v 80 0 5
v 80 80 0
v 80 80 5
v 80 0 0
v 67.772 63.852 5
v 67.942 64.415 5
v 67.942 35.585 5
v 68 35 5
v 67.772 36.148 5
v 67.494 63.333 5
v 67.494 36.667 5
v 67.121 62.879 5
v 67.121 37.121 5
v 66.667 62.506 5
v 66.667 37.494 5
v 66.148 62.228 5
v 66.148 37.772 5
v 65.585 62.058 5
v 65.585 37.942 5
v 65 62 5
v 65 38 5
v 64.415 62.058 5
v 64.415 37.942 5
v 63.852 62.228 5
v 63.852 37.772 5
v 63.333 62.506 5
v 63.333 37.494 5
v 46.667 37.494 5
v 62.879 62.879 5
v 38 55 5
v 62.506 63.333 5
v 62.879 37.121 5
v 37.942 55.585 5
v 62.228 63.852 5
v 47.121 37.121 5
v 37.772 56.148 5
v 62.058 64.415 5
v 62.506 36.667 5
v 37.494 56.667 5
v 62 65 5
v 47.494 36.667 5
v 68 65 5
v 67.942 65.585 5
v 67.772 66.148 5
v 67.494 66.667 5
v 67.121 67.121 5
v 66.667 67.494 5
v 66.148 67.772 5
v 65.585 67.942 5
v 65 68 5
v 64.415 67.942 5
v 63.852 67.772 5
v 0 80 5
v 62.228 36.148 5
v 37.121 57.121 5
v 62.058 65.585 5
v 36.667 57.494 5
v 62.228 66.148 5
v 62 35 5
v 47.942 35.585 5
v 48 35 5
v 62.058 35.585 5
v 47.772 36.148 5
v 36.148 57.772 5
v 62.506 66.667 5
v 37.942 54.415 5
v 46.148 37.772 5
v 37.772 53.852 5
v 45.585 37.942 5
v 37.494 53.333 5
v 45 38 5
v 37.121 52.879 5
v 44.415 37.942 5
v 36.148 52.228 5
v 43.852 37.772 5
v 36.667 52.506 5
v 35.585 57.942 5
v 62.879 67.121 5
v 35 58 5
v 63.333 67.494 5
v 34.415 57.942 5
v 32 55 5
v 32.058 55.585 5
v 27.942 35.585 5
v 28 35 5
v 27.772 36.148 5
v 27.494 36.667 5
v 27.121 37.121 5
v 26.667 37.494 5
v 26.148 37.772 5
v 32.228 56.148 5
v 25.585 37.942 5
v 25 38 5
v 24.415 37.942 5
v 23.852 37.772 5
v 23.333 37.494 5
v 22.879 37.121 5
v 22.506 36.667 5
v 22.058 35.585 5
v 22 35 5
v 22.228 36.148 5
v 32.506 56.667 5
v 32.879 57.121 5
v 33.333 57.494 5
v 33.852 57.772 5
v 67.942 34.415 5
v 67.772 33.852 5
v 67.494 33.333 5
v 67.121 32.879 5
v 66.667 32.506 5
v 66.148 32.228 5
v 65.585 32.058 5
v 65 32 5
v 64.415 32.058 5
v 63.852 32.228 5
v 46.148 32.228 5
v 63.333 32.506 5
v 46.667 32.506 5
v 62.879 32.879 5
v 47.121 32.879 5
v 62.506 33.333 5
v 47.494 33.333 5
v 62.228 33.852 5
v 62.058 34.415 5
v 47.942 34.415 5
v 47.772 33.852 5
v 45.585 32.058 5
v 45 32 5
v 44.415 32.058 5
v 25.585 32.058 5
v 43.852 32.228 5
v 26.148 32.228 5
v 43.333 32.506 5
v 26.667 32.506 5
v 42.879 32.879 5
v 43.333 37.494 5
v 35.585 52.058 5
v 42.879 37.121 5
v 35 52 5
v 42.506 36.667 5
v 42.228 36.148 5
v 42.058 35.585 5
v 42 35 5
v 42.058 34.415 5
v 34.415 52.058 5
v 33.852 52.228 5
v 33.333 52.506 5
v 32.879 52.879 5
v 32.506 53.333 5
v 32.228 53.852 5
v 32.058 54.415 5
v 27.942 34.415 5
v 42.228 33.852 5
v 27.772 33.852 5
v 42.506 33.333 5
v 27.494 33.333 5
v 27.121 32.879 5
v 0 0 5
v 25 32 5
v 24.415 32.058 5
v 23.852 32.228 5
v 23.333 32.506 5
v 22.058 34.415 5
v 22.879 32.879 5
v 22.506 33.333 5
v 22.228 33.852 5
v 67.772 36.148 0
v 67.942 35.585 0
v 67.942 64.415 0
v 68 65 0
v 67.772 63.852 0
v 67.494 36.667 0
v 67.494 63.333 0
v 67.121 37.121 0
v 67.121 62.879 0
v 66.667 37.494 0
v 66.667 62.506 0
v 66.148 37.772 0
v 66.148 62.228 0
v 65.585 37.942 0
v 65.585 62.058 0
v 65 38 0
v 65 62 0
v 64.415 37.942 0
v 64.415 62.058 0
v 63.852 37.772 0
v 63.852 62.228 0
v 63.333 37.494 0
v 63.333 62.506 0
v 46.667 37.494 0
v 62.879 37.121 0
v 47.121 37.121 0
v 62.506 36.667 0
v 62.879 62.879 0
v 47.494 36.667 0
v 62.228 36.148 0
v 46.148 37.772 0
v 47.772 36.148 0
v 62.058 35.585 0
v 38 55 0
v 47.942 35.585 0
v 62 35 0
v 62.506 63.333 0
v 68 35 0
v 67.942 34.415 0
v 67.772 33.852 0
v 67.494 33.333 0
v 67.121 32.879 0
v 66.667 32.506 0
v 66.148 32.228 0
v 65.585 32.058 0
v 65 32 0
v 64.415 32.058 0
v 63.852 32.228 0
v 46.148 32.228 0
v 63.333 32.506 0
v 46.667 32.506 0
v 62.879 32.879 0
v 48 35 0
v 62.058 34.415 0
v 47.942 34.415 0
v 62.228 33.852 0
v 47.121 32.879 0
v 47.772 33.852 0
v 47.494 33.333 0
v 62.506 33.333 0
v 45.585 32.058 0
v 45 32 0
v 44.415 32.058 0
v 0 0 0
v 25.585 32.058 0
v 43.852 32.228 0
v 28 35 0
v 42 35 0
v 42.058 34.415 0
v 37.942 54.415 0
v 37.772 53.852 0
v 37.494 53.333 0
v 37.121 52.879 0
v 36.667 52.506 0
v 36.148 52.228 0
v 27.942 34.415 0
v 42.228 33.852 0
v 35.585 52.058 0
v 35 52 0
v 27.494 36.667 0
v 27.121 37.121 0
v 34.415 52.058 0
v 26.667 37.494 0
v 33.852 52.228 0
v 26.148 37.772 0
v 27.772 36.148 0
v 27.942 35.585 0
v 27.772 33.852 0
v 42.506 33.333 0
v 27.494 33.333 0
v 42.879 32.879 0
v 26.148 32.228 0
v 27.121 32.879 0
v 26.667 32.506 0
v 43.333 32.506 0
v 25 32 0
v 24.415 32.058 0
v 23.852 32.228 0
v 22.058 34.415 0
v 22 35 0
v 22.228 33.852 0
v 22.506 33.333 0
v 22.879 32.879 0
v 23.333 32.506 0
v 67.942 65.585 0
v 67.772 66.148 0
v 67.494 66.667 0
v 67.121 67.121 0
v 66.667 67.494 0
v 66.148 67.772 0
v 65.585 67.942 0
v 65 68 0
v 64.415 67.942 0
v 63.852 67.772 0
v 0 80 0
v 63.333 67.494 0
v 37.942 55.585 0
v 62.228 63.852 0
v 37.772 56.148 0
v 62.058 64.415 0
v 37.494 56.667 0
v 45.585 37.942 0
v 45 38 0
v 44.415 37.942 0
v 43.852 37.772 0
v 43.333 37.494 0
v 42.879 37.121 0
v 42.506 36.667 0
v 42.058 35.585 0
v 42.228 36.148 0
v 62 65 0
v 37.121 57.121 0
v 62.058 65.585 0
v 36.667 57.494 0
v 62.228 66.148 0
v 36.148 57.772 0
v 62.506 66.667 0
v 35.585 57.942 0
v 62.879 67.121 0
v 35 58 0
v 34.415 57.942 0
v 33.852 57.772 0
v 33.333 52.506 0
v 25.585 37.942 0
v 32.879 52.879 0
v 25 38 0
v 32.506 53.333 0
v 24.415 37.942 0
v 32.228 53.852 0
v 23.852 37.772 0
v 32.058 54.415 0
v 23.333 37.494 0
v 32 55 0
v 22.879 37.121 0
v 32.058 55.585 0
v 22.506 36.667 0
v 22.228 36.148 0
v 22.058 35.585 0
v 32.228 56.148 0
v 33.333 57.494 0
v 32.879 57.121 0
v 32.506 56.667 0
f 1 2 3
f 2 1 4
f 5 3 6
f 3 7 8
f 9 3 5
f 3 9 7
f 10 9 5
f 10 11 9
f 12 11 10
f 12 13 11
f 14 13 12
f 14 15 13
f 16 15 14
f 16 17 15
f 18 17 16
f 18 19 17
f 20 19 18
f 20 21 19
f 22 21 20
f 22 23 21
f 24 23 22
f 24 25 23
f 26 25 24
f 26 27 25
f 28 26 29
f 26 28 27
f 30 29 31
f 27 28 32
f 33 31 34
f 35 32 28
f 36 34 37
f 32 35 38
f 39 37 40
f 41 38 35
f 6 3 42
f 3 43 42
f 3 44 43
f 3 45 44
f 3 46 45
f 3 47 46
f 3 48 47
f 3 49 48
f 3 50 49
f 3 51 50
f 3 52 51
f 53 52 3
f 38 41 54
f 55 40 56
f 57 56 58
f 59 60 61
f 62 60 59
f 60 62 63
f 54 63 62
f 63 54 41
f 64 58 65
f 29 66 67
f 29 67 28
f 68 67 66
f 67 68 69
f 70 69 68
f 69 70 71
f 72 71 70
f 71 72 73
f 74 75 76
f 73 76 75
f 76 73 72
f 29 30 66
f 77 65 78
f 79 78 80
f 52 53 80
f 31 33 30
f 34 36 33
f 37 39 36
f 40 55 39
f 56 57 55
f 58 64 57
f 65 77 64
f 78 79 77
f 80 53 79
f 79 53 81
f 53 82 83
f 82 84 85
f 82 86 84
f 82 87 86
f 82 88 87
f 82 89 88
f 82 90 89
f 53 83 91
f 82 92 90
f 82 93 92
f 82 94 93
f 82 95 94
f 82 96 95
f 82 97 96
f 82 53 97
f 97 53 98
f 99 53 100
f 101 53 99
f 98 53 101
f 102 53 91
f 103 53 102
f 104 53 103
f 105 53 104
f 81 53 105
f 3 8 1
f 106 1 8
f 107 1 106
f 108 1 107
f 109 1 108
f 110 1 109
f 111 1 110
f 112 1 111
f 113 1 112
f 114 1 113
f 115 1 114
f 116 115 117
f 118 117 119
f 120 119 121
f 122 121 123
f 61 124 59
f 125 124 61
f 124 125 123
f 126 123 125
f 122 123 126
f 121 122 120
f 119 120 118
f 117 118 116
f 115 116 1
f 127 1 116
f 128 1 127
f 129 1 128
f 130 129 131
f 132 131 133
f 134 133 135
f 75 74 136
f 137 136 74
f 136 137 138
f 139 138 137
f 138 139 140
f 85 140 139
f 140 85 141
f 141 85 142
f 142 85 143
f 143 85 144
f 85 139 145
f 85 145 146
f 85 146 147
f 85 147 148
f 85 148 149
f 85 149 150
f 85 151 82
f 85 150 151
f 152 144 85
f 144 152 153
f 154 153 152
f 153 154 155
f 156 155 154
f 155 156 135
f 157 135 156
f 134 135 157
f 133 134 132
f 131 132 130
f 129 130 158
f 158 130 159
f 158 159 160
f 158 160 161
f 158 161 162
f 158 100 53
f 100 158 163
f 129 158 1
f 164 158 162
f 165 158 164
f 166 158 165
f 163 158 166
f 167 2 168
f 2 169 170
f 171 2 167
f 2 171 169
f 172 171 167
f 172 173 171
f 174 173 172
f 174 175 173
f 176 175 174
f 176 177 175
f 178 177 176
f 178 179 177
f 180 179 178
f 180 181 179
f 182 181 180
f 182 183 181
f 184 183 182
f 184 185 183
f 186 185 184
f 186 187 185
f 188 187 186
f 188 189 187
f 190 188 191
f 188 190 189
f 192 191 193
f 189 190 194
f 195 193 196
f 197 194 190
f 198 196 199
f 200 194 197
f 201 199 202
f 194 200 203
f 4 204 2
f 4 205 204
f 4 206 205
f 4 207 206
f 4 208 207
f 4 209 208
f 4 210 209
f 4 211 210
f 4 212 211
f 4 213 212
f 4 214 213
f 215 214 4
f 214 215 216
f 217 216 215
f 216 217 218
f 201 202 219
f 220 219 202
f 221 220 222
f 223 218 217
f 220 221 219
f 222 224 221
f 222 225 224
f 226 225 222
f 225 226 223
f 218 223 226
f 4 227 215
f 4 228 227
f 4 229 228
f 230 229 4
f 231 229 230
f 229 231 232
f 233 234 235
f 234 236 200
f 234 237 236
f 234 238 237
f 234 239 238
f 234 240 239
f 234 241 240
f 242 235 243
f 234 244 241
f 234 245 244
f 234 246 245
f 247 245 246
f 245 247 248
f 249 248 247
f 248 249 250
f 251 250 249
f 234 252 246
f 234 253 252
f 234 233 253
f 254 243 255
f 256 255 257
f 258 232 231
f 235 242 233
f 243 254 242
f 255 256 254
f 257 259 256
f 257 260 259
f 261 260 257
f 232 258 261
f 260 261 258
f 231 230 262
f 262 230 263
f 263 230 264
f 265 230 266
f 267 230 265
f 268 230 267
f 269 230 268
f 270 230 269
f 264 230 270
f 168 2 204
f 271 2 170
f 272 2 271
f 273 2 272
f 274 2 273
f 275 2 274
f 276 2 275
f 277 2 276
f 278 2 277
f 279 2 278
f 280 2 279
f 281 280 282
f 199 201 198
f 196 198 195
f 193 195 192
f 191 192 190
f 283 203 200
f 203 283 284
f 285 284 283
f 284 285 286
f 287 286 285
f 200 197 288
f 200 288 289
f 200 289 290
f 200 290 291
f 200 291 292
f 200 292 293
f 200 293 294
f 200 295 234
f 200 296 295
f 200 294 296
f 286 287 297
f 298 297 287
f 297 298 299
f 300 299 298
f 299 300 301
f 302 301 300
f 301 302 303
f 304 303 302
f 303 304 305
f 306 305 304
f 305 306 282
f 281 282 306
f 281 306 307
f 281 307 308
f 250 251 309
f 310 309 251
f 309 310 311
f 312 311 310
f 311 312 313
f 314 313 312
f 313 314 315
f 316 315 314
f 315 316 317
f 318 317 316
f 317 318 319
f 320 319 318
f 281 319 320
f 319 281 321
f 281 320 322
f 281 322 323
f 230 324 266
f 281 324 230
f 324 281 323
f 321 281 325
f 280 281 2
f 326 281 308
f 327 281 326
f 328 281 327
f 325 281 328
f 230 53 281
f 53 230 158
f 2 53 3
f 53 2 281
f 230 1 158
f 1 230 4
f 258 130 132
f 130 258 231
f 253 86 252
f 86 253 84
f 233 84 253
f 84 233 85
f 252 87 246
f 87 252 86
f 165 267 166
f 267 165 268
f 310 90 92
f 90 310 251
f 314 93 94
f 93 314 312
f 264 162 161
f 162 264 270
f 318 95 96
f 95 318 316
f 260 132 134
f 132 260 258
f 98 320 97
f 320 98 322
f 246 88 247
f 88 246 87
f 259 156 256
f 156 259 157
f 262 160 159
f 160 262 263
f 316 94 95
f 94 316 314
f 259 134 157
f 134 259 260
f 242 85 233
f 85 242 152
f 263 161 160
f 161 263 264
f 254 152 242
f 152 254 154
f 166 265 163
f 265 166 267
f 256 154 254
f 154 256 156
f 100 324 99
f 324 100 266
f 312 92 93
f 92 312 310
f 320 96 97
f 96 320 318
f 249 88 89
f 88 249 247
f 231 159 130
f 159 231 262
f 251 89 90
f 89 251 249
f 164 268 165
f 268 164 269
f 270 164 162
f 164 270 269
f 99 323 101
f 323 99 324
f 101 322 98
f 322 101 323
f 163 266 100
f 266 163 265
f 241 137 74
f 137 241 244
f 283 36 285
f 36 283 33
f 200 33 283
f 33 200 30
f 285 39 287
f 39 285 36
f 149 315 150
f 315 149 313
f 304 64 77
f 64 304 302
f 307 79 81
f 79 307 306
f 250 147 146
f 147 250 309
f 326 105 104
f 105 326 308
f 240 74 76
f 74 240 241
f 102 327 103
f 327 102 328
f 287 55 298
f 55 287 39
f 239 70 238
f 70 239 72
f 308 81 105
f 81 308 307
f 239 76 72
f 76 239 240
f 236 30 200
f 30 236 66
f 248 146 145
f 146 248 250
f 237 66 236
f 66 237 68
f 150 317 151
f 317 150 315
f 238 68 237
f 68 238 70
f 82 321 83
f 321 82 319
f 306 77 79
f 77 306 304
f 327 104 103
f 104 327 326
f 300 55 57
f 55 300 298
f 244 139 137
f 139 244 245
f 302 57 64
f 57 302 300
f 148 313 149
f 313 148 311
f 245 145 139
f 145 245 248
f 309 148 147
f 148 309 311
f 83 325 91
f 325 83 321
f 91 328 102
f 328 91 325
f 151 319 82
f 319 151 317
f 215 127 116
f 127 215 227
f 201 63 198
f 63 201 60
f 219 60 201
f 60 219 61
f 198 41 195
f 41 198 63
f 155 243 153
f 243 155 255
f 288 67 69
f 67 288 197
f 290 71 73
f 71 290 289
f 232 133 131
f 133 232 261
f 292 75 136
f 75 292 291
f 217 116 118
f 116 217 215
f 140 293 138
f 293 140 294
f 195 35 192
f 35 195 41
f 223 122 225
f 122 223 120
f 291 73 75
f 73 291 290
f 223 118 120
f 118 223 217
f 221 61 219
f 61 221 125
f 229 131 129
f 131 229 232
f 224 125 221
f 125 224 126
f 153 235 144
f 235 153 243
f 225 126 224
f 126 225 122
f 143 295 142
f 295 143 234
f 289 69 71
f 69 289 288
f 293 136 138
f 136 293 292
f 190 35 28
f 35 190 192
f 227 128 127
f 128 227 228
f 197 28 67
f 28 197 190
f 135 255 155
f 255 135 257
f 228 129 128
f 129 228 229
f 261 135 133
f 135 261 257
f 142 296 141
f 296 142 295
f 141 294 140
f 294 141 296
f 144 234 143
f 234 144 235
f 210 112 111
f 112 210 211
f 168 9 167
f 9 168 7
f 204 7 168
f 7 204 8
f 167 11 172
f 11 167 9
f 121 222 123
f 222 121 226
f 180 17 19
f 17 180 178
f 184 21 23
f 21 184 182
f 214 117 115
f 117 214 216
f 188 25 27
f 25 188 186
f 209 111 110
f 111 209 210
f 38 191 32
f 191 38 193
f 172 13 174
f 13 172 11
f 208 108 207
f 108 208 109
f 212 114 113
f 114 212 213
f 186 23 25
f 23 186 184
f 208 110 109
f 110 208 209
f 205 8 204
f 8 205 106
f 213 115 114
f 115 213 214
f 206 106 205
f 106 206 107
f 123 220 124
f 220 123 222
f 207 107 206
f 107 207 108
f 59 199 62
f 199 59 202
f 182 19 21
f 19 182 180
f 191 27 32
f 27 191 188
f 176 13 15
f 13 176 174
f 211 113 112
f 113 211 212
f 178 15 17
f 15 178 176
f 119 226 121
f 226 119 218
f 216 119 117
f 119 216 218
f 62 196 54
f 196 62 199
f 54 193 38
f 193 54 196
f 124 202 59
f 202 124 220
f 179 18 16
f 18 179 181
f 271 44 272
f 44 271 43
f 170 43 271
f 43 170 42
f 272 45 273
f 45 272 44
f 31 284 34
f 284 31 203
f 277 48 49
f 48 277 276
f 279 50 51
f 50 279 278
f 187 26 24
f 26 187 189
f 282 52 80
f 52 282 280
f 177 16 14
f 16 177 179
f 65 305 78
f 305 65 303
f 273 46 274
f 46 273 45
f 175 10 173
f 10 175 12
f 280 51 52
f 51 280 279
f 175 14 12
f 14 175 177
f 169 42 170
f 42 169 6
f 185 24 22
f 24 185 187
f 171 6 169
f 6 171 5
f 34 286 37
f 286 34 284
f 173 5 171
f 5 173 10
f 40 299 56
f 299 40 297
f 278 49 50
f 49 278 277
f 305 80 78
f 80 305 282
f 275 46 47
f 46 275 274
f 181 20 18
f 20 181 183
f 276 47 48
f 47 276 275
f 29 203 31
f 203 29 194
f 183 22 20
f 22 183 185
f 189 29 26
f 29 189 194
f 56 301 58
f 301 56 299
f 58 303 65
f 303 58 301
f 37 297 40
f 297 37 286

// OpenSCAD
$fn = 32;

// ----------------------------------------------------------------------
// Hole field: plate with holes at given coordinates
// ----------------------------------------------------------------------

// --- parameters (mm) ---
plate_l = 80;             // plate length, X
plate_w = 80;             // plate width, Y
plate_t = 5;              // plate thickness, Z
hole_d = 6;               // hole diameter
fit_tol = 0.05;           // tolerance for press fits, mm
free_tol = 0.3;           // tolerance for clearance fits, mm

difference() {
  cube([plate_l, plate_w, plate_t]);
  translate([25, 35, -1]) cylinder(h = plate_t + 2, d = hole_d);
  translate([35, 55, -1]) cylinder(h = plate_t + 2, d = hole_d);
  translate([45, 35, -1]) cylinder(h = plate_t + 2, d = hole_d);
  translate([65, 35, -1]) cylinder(h = plate_t + 2, d = hole_d);
  translate([65, 65, -1]) cylinder(h = plate_t + 2, d = hole_d);
}
